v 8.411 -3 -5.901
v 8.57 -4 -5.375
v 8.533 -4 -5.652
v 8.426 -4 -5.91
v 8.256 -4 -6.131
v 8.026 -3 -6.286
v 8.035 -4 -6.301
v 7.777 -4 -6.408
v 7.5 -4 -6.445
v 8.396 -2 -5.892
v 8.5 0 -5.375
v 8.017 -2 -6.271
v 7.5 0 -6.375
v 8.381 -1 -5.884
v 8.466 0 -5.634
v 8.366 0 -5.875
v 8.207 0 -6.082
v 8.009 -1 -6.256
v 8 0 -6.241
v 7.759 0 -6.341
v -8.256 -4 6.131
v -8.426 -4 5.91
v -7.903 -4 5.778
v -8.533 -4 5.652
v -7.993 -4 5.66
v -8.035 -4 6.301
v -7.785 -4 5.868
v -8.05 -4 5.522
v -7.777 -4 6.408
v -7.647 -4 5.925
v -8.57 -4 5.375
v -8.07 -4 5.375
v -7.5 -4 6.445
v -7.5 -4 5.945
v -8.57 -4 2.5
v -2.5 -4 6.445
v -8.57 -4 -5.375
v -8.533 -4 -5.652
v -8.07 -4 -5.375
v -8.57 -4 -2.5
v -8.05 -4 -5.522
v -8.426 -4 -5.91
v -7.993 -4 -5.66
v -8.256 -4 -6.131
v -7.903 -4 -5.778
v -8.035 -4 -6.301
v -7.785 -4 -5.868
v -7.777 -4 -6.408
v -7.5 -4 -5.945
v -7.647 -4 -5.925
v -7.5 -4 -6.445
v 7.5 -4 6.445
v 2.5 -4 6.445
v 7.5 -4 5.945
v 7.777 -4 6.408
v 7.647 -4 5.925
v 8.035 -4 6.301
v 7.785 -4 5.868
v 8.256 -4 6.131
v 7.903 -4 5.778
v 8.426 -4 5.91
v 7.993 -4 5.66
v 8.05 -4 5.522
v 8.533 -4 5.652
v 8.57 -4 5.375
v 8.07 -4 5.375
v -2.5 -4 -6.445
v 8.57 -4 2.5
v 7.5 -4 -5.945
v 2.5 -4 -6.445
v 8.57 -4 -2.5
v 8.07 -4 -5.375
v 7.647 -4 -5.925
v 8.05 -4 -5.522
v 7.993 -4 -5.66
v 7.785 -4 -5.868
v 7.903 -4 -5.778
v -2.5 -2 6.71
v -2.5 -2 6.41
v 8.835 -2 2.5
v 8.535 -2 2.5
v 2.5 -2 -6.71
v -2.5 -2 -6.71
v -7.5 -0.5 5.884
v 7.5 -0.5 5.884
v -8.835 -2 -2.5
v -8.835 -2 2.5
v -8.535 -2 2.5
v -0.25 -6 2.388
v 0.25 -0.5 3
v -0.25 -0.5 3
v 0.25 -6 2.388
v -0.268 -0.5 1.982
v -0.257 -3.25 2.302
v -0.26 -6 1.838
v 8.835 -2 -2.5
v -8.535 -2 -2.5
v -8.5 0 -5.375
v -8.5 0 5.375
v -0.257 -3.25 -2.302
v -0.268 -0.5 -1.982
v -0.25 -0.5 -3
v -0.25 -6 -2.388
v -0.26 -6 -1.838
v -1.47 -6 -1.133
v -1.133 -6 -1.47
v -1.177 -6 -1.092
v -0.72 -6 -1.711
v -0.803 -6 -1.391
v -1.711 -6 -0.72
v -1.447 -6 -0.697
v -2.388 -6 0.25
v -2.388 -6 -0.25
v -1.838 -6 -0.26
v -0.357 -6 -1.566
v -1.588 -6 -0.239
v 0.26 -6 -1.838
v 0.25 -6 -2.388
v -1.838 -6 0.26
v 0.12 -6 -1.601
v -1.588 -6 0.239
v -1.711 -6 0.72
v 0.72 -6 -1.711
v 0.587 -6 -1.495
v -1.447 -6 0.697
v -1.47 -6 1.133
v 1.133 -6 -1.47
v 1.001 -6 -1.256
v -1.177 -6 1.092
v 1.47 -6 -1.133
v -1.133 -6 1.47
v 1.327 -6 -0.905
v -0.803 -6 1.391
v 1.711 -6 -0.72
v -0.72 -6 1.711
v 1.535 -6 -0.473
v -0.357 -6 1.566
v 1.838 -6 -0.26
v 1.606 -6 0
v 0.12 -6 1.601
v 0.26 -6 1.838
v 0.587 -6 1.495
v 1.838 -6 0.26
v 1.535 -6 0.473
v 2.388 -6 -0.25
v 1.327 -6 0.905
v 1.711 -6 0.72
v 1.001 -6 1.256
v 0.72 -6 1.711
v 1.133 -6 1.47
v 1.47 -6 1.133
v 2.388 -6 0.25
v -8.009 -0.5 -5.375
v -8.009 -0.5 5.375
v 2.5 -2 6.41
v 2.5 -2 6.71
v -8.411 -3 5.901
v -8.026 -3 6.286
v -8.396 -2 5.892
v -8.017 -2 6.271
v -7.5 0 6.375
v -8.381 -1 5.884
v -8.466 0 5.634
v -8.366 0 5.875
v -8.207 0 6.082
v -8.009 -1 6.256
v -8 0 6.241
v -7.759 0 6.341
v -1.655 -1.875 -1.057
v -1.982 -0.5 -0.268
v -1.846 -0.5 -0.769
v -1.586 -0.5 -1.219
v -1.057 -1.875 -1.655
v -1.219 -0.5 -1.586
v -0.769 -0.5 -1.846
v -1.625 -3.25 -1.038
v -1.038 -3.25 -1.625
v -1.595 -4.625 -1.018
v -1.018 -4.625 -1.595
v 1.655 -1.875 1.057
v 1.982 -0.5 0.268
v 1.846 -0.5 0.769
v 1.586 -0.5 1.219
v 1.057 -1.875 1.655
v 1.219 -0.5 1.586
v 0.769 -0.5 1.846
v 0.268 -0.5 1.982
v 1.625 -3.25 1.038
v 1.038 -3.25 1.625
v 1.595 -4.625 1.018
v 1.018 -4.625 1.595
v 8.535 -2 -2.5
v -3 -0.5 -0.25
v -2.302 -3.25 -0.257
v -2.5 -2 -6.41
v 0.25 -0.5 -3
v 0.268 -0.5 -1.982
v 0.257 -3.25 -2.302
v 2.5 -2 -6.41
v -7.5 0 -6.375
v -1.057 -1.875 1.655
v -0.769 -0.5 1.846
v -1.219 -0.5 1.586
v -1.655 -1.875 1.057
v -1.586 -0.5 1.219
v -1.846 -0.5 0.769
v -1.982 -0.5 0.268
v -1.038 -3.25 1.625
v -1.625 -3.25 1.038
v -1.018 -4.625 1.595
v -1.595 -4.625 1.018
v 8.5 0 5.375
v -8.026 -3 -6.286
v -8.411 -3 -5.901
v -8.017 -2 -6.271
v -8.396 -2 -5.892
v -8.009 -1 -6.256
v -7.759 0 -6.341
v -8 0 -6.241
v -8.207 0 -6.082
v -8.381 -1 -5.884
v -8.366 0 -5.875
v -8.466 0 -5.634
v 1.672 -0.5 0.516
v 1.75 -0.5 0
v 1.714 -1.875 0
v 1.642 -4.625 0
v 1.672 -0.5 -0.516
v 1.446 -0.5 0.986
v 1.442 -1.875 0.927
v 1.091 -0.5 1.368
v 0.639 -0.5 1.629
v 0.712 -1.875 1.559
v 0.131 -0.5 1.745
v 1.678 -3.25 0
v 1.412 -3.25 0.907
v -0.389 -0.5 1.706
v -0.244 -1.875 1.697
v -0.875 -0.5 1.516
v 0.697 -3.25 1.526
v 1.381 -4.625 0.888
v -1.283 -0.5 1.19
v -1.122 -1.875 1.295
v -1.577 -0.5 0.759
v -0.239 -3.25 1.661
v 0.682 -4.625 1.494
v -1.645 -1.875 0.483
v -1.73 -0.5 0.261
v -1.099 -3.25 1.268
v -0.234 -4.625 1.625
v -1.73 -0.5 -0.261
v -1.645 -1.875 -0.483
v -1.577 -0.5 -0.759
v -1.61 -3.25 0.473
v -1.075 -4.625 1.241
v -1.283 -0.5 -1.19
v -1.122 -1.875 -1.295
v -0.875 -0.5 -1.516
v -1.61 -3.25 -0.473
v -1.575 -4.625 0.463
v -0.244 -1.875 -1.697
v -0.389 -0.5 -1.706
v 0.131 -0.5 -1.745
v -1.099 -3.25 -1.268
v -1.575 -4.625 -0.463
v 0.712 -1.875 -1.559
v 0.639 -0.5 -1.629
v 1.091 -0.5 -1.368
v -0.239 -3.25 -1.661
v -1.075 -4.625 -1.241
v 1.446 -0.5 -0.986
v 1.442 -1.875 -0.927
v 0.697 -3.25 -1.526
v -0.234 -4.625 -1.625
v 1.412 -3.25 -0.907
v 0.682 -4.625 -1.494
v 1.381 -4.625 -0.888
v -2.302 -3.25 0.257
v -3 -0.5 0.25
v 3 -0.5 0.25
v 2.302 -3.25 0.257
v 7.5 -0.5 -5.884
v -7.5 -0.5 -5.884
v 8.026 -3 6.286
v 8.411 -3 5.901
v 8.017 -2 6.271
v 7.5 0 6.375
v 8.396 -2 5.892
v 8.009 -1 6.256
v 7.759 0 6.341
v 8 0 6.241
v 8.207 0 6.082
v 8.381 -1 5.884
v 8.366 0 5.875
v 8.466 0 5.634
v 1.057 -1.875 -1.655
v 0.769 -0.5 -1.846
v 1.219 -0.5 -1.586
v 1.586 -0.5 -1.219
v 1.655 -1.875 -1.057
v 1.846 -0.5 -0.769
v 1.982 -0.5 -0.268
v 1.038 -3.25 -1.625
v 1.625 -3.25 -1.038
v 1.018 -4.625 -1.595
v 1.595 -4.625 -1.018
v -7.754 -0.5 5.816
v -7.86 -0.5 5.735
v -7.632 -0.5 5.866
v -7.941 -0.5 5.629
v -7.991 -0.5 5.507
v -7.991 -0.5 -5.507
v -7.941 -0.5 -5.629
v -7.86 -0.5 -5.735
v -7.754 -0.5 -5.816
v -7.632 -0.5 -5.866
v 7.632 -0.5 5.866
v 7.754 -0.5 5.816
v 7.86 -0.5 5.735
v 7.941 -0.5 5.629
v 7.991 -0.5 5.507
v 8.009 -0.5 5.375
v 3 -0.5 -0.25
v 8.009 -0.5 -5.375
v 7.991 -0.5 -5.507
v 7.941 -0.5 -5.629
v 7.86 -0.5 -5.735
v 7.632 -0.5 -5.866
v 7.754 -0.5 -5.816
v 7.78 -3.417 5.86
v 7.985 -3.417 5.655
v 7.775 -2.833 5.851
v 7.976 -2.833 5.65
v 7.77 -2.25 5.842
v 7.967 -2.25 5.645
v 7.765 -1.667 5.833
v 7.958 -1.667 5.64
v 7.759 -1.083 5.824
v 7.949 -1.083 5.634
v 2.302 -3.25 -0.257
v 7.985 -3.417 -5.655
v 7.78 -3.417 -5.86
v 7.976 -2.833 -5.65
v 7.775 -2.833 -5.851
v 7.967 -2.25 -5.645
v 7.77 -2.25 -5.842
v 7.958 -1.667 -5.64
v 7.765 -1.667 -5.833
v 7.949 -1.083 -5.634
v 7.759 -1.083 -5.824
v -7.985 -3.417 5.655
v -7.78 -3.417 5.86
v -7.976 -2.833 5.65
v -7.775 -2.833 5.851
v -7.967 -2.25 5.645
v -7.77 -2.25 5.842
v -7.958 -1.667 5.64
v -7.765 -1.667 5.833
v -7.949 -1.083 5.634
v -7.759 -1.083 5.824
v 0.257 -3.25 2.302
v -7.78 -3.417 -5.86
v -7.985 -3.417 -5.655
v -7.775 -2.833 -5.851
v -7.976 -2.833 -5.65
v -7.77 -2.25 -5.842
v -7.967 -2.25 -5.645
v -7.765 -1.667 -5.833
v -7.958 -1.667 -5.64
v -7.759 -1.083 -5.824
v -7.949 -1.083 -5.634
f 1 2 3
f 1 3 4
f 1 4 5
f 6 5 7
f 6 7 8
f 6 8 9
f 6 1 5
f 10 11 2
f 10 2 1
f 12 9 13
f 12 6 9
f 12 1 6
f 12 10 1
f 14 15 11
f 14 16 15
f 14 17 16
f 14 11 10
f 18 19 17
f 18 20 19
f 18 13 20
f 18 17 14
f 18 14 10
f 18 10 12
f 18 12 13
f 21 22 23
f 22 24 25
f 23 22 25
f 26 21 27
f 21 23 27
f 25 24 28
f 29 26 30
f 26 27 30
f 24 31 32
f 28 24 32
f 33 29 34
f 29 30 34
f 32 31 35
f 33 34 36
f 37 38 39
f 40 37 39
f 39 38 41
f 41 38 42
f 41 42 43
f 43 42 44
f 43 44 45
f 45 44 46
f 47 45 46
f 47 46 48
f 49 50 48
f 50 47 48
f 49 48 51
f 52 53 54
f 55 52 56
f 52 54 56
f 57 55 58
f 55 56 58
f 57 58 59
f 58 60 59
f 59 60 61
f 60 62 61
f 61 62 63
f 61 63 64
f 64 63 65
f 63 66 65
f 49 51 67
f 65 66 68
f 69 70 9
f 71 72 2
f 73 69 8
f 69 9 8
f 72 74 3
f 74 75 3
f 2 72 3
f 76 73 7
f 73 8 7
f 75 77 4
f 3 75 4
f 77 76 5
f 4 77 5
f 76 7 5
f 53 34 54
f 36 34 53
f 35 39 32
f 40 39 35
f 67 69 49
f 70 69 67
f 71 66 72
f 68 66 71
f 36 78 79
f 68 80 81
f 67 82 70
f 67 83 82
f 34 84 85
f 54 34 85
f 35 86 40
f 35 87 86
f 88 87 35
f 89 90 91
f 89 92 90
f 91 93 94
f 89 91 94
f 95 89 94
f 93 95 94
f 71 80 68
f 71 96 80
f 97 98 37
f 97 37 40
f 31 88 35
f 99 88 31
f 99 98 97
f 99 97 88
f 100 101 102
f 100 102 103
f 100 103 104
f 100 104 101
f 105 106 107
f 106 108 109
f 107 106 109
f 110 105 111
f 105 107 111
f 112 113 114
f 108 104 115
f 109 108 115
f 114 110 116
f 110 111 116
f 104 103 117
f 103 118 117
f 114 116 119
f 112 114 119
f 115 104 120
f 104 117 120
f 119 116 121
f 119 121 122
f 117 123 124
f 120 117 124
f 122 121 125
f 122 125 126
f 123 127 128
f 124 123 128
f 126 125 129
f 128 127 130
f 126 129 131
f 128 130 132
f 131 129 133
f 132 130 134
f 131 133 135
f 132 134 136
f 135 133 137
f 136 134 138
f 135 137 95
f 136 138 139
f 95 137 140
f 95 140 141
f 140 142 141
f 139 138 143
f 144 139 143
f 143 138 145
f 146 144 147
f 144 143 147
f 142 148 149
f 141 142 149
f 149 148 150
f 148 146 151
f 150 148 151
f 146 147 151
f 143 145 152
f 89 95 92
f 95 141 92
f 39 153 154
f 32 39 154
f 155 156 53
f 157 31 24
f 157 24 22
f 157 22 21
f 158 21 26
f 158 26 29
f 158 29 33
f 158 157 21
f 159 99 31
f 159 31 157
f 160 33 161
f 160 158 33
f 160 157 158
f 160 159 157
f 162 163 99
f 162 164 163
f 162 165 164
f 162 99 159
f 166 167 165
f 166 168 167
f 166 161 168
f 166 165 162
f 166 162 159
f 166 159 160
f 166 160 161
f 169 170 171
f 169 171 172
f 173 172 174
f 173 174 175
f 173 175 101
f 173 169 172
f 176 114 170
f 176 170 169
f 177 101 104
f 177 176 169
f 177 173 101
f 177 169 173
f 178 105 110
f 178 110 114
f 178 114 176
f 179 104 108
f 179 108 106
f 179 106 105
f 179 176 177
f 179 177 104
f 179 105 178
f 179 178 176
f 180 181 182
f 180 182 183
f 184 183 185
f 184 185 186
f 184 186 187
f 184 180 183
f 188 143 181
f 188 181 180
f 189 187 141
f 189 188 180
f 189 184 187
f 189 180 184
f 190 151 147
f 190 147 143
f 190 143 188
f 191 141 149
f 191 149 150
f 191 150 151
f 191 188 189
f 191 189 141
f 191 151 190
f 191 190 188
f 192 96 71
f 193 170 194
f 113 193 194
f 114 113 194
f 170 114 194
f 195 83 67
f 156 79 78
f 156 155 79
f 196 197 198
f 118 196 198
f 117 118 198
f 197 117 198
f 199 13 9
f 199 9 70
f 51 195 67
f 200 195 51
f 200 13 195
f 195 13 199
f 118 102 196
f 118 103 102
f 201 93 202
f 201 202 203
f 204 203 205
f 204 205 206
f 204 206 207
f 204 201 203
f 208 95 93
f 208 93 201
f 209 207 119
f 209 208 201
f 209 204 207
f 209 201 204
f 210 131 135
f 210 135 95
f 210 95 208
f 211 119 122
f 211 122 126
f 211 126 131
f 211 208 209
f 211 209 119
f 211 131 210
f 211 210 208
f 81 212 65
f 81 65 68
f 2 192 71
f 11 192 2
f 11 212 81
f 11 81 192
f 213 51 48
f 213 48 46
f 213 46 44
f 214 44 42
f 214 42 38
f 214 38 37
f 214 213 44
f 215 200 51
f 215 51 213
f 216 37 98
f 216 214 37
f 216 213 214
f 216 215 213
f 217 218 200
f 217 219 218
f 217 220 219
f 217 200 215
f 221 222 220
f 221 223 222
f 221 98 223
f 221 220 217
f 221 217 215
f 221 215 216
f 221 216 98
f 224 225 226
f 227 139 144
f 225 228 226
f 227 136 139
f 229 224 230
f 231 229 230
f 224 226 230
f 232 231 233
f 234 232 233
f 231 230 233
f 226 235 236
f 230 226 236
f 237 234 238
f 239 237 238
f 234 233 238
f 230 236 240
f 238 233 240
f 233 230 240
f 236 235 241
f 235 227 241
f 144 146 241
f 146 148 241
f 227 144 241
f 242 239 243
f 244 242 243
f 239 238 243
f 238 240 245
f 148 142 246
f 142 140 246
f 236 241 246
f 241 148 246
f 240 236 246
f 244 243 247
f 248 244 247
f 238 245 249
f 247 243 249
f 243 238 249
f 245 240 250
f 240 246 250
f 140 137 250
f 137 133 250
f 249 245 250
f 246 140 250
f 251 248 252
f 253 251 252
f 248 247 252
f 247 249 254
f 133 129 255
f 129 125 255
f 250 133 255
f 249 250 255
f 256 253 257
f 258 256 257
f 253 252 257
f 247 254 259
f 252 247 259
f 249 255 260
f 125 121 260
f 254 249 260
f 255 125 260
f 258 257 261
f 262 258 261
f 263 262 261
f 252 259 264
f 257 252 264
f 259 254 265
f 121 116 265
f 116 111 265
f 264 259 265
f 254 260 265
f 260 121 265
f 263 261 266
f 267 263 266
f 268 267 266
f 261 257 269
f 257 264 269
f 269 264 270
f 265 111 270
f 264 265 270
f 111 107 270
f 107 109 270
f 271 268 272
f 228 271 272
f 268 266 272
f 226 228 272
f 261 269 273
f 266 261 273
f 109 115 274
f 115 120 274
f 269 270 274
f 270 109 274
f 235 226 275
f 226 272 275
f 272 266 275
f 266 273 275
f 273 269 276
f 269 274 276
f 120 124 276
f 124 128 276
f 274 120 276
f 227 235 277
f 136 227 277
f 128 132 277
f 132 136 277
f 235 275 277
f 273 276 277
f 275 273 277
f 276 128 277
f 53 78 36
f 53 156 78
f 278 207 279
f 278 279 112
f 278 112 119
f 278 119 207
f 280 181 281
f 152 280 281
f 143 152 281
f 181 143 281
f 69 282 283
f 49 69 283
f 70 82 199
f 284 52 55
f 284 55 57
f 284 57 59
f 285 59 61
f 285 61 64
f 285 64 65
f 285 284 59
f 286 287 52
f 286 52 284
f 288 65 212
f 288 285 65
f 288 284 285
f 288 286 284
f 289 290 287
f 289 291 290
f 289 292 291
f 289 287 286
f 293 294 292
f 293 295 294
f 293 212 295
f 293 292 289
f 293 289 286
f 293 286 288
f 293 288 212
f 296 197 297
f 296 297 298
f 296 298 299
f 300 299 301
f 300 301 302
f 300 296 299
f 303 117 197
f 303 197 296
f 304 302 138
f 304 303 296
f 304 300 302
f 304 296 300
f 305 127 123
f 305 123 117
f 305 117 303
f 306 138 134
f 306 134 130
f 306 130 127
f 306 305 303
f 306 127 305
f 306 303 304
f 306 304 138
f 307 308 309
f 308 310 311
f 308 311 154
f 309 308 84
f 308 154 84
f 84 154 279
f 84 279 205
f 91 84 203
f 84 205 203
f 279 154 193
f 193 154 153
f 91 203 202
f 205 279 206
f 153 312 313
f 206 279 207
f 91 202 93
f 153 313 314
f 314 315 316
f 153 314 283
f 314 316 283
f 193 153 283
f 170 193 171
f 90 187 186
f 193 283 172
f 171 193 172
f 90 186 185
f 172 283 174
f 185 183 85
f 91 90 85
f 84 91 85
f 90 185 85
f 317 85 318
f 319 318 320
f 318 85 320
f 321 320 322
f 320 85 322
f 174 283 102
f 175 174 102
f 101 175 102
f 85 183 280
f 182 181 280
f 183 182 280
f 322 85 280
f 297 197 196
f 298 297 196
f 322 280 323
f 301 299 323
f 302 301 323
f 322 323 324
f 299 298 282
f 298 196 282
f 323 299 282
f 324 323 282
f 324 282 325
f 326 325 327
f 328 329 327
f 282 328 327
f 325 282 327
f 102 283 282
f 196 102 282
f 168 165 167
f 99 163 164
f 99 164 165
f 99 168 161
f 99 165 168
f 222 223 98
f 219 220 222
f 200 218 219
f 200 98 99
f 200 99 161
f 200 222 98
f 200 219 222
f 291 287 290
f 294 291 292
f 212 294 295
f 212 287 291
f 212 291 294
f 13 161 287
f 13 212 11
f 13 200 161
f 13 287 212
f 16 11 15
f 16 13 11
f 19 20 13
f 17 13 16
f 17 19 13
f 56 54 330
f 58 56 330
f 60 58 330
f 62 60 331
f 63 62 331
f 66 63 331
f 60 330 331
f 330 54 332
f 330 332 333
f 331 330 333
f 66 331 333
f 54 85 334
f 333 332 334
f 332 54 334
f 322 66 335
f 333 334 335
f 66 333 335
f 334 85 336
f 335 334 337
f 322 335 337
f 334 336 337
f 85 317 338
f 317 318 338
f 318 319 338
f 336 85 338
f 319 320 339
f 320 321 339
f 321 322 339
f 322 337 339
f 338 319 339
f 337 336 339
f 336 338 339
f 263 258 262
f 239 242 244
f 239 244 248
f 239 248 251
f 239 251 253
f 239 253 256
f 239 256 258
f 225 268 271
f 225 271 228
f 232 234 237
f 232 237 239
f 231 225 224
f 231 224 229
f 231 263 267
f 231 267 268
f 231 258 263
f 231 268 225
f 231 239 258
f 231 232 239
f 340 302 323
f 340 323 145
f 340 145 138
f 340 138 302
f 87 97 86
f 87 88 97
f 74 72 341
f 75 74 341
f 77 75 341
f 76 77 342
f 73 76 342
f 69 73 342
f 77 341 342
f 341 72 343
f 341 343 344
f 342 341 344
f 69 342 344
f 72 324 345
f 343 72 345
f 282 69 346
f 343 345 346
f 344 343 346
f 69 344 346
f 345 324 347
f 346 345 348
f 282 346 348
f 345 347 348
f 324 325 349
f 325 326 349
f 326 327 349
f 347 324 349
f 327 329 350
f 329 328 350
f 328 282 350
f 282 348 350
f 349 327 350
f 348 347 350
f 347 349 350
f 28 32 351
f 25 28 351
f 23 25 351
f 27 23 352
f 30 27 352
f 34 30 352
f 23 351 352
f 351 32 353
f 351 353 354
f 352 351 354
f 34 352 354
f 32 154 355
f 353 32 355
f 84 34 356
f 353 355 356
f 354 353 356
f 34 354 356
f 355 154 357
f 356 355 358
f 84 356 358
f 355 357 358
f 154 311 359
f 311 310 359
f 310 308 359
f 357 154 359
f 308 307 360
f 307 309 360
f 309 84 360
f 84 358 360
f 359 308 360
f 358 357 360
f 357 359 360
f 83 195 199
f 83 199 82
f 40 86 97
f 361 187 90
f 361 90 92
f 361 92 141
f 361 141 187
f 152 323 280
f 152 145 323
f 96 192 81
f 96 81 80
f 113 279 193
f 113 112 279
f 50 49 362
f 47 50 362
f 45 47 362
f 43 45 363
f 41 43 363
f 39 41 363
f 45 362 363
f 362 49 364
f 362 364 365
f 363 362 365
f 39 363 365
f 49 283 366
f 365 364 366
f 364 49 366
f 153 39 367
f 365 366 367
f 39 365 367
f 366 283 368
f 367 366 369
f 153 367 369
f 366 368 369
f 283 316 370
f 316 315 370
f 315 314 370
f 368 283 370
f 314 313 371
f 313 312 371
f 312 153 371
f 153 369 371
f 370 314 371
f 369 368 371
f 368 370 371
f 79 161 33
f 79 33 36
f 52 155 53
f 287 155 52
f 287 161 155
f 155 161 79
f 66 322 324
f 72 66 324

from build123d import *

# Parameters (mm, degrees)
BOSS_EXTRUDE1_DEPTH = 4
BOSS_EXTRUDE1_DRAFT = 1
SHELL1_T            = -0.5
SKETCH2_R           = 2
BOSS_EXTRUDE2_DEPTH = 5.5
BOSS_EXTRUDE2_TAPER = 1.5
SKETCH4_R           = 1.605977431
CUT_EXTRUDE1_DEPTH  = 5.5
CUT_EXTRUDE1_DRAFT  = 1.5
BOSS_EXTRUDE3_DEPTH = 2.5
BOSS_EXTRUDE4_DEPTH = 2.5


with BuildPart() as part:
    # Sketch1 → Boss-Extrude1 (with draft: the straight prism first)
    with BuildSketch(Plane(origin=(0, 0, 0), x_dir=(1, 0, 0), z_dir=(0, 1, 0))):
        with BuildLine():
            Line((-7.5, -6.375), (7.5, -6.375))
            ThreePointArc((7.5, -6.375), (8.207106781, -6.082106781), (8.5, -5.375))
            Line((8.5, -5.375), (8.5, 5.375))
            ThreePointArc((8.5, 5.375), (8.207106781, 6.082106781), (7.5, 6.375))
            Line((7.5, 6.375), (-7.5, 6.375))
            ThreePointArc((-7.5, 6.375), (-8.207106781, 6.082106781), (-8.5, 5.375))
            Line((-8.5, 5.375), (-8.5, -5.375))
            ThreePointArc((-8.5, -5.375), (-8.207106781, -6.082106781), (-7.5, -6.375))
        make_face()
    extrude(amount=-BOSS_EXTRUDE1_DEPTH)
    # Boss-Extrude1: the draft: its side faces are tilted about the plane it starts from
    boss_extrude1_sides = [part.faces().sort_by_distance(p)[0] for p in [
        (0, -2, 6.375),
        (8.207106781, -2, 6.082106781),
        (8.5, -2, 0),
        (8.207106781, -2, -6.082106781),
        (0, -2, -6.375),
        (-8.207106781, -2, -6.082106781),
        (-8.5, -2, 0),
        (-8.207106781, -2, 6.082106781),
    ]]
    draft(boss_extrude1_sides, Plane(origin=(0, 0, 0), x_dir=(1, 0, 0), z_dir=(0, 1, 0)), BOSS_EXTRUDE1_DRAFT)

    # Shell1
    shell1_openings = [part.faces().sort_by_distance(p)[0] for p in [
        (0, -4, 0),
    ]]
    offset(amount=SHELL1_T, openings=shell1_openings, kind=Kind.INTERSECTION)

    # Sketch2 → Boss-Extrude2 (add)
    with BuildSketch(Plane.XZ.offset(0.5)):
        Circle(SKETCH2_R)
    extrude(amount=BOSS_EXTRUDE2_DEPTH, taper=BOSS_EXTRUDE2_TAPER)

    # Rib1: read off the stored shape, not the designer's step
    # Rib1: loft between two sections, ruled curve by curve
    rib1_from = [
        Edge.make_line((1.982008604, -0.5, 0.267660037), (3, -0.5, 0.25)),
        Edge.make_line((1.982008604, -0.5, -0.267660037), (3, -0.5, -0.25)),
        Edge.make_line((3, -0.5, -0.25), (3, -0.5, 0.25)),
        Edge.make_line((1.982008604, -0.5, -0.267660037), (1.982008604, -0.5, 0.267660037)),
    ]
    rib1_to = [
        Edge.make_line((1.83774048, -6, 0.259542201), (2.387789079, -6, 0.25)),
        Edge.make_line((1.83774048, -6, -0.259542201), (2.387789079, -6, -0.25)),
        Edge.make_line((2.387789079, -6, -0.25), (2.387789079, -6, 0.25)),
        Edge.make_line((1.83774048, -6, -0.259542201), (1.83774048, -6, 0.259542201)),
    ]
    rib1 = Solid(Shell([*[Face.make_surface_from_curves(rib1_from[k], rib1_to[k]) for k in range(4)], Face(Wire(rib1_from)), Face(Wire(rib1_to))]))
    add(rib1)

    # CirPattern1: read off the stored shape, not the designer's step
    # CirPattern1: loft between two sections, ruled curve by curve
    cirpattern1_from = [
        Edge.make_line((-0.267660037, -0.5, 1.982008604), (-0.25, -0.5, 3)),
        Edge.make_line((0.267660037, -0.5, 1.982008604), (0.25, -0.5, 3)),
        Edge.make_line((0.25, -0.5, 3), (-0.25, -0.5, 3)),
        Edge.make_line((0.267660037, -0.5, 1.982008604), (-0.267660037, -0.5, 1.982008604)),
    ]
    cirpattern1_to = [
        Edge.make_line((-0.259542201, -6, 1.83774048), (-0.25, -6, 2.387789079)),
        Edge.make_line((0.259542201, -6, 1.83774048), (0.25, -6, 2.387789079)),
        Edge.make_line((0.25, -6, 2.387789079), (-0.25, -6, 2.387789079)),
        Edge.make_line((0.259542201, -6, 1.83774048), (-0.259542201, -6, 1.83774048)),
    ]
    cirpattern1 = Solid(Shell([*[Face.make_surface_from_curves(cirpattern1_from[k], cirpattern1_to[k]) for k in range(4)], Face(Wire(cirpattern1_from)), Face(Wire(cirpattern1_to))]))
    add(cirpattern1)

    # CirPattern1 2: loft between two sections, ruled curve by curve
    cirpattern1_2_from = [
        Edge.make_line((-1.982008604, -0.5, -0.267660037), (-3, -0.5, -0.25)),
        Edge.make_line((-1.982008604, -0.5, 0.267660037), (-3, -0.5, 0.25)),
        Edge.make_line((-3, -0.5, 0.25), (-3, -0.5, -0.25)),
        Edge.make_line((-1.982008604, -0.5, 0.267660037), (-1.982008604, -0.5, -0.267660037)),
    ]
    cirpattern1_2_to = [
        Edge.make_line((-1.83774048, -6, -0.259542201), (-2.387789079, -6, -0.25)),
        Edge.make_line((-1.83774048, -6, 0.259542201), (-2.387789079, -6, 0.25)),
        Edge.make_line((-2.387789079, -6, 0.25), (-2.387789079, -6, -0.25)),
        Edge.make_line((-1.83774048, -6, 0.259542201), (-1.83774048, -6, -0.259542201)),
    ]
    cirpattern1_2 = Solid(Shell([*[Face.make_surface_from_curves(cirpattern1_2_from[k], cirpattern1_2_to[k]) for k in range(4)], Face(Wire(cirpattern1_2_from)), Face(Wire(cirpattern1_2_to))]))
    add(cirpattern1_2)

    # CirPattern1 3: loft between two sections, ruled curve by curve
    cirpattern1_3_from = [
        Edge.make_line((0.267660037, -0.5, -1.982008604), (0.25, -0.5, -3)),
        Edge.make_line((-0.267660037, -0.5, -1.982008604), (-0.25, -0.5, -3)),
        Edge.make_line((-0.25, -0.5, -3), (0.25, -0.5, -3)),
        Edge.make_line((-0.267660037, -0.5, -1.982008604), (0.267660037, -0.5, -1.982008604)),
    ]
    cirpattern1_3_to = [
        Edge.make_line((0.259542201, -6, -1.83774048), (0.25, -6, -2.387789079)),
        Edge.make_line((-0.259542201, -6, -1.83774048), (-0.25, -6, -2.387789079)),
        Edge.make_line((-0.25, -6, -2.387789079), (0.25, -6, -2.387789079)),
        Edge.make_line((-0.259542201, -6, -1.83774048), (0.259542201, -6, -1.83774048)),
    ]
    cirpattern1_3 = Solid(Shell([*[Face.make_surface_from_curves(cirpattern1_3_from[k], cirpattern1_3_to[k]) for k in range(4)], Face(Wire(cirpattern1_3_from)), Face(Wire(cirpattern1_3_to))]))
    add(cirpattern1_3)


with BuildPart() as cut_extrude1_tool:
    # Sketch4 → Cut-Extrude1 (with draft: the straight prism first)
    with BuildSketch(Plane.XZ.offset(6)):
        Circle(SKETCH4_R)
    extrude(amount=-CUT_EXTRUDE1_DEPTH)
    # Cut-Extrude1: the draft: its side faces are tilted about the plane it starts from
    cut_extrude1_sides = [cut_extrude1_tool.faces().sort_by_distance(p)[0] for p in [
        (-1.605977431, -3.25, 0),
    ]]
    draft(cut_extrude1_sides, Plane.XZ.offset(6), CUT_EXTRUDE1_DRAFT)


with BuildPart() as part_1:
    add(part.part)

    # Cut-Extrude1: cut by cut_extrude1_tool
    add(cut_extrude1_tool.part, mode=Mode.SUBTRACT)

    # Sketch5 → Boss-Extrude3 (add, symmetric)
    with BuildSketch(Plane(origin=(0, 0, 0), x_dir=(0, 0, -1), z_dir=(1, 0, 0))):
        Polygon((6.44482026, -4), (6.40991013, -2), (6.70991013, -2), align=None)
        Polygon((-6.70991013, -2), (-6.44482026, -4), (-6.40991013, -2), align=None)
    extrude(amount=BOSS_EXTRUDE3_DEPTH, both=True)

    # Sketch6 → Boss-Extrude4 (add, symmetric)
    with BuildSketch(Plane.XY):
        Polygon((8.56982026, -4), (8.53491013, -2), (8.83491013, -2), align=None)
        Polygon((-8.83491013, -2), (-8.56982026, -4), (-8.53491013, -2), align=None)
    extrude(amount=BOSS_EXTRUDE4_DEPTH, both=True)


solid = part_1.part
